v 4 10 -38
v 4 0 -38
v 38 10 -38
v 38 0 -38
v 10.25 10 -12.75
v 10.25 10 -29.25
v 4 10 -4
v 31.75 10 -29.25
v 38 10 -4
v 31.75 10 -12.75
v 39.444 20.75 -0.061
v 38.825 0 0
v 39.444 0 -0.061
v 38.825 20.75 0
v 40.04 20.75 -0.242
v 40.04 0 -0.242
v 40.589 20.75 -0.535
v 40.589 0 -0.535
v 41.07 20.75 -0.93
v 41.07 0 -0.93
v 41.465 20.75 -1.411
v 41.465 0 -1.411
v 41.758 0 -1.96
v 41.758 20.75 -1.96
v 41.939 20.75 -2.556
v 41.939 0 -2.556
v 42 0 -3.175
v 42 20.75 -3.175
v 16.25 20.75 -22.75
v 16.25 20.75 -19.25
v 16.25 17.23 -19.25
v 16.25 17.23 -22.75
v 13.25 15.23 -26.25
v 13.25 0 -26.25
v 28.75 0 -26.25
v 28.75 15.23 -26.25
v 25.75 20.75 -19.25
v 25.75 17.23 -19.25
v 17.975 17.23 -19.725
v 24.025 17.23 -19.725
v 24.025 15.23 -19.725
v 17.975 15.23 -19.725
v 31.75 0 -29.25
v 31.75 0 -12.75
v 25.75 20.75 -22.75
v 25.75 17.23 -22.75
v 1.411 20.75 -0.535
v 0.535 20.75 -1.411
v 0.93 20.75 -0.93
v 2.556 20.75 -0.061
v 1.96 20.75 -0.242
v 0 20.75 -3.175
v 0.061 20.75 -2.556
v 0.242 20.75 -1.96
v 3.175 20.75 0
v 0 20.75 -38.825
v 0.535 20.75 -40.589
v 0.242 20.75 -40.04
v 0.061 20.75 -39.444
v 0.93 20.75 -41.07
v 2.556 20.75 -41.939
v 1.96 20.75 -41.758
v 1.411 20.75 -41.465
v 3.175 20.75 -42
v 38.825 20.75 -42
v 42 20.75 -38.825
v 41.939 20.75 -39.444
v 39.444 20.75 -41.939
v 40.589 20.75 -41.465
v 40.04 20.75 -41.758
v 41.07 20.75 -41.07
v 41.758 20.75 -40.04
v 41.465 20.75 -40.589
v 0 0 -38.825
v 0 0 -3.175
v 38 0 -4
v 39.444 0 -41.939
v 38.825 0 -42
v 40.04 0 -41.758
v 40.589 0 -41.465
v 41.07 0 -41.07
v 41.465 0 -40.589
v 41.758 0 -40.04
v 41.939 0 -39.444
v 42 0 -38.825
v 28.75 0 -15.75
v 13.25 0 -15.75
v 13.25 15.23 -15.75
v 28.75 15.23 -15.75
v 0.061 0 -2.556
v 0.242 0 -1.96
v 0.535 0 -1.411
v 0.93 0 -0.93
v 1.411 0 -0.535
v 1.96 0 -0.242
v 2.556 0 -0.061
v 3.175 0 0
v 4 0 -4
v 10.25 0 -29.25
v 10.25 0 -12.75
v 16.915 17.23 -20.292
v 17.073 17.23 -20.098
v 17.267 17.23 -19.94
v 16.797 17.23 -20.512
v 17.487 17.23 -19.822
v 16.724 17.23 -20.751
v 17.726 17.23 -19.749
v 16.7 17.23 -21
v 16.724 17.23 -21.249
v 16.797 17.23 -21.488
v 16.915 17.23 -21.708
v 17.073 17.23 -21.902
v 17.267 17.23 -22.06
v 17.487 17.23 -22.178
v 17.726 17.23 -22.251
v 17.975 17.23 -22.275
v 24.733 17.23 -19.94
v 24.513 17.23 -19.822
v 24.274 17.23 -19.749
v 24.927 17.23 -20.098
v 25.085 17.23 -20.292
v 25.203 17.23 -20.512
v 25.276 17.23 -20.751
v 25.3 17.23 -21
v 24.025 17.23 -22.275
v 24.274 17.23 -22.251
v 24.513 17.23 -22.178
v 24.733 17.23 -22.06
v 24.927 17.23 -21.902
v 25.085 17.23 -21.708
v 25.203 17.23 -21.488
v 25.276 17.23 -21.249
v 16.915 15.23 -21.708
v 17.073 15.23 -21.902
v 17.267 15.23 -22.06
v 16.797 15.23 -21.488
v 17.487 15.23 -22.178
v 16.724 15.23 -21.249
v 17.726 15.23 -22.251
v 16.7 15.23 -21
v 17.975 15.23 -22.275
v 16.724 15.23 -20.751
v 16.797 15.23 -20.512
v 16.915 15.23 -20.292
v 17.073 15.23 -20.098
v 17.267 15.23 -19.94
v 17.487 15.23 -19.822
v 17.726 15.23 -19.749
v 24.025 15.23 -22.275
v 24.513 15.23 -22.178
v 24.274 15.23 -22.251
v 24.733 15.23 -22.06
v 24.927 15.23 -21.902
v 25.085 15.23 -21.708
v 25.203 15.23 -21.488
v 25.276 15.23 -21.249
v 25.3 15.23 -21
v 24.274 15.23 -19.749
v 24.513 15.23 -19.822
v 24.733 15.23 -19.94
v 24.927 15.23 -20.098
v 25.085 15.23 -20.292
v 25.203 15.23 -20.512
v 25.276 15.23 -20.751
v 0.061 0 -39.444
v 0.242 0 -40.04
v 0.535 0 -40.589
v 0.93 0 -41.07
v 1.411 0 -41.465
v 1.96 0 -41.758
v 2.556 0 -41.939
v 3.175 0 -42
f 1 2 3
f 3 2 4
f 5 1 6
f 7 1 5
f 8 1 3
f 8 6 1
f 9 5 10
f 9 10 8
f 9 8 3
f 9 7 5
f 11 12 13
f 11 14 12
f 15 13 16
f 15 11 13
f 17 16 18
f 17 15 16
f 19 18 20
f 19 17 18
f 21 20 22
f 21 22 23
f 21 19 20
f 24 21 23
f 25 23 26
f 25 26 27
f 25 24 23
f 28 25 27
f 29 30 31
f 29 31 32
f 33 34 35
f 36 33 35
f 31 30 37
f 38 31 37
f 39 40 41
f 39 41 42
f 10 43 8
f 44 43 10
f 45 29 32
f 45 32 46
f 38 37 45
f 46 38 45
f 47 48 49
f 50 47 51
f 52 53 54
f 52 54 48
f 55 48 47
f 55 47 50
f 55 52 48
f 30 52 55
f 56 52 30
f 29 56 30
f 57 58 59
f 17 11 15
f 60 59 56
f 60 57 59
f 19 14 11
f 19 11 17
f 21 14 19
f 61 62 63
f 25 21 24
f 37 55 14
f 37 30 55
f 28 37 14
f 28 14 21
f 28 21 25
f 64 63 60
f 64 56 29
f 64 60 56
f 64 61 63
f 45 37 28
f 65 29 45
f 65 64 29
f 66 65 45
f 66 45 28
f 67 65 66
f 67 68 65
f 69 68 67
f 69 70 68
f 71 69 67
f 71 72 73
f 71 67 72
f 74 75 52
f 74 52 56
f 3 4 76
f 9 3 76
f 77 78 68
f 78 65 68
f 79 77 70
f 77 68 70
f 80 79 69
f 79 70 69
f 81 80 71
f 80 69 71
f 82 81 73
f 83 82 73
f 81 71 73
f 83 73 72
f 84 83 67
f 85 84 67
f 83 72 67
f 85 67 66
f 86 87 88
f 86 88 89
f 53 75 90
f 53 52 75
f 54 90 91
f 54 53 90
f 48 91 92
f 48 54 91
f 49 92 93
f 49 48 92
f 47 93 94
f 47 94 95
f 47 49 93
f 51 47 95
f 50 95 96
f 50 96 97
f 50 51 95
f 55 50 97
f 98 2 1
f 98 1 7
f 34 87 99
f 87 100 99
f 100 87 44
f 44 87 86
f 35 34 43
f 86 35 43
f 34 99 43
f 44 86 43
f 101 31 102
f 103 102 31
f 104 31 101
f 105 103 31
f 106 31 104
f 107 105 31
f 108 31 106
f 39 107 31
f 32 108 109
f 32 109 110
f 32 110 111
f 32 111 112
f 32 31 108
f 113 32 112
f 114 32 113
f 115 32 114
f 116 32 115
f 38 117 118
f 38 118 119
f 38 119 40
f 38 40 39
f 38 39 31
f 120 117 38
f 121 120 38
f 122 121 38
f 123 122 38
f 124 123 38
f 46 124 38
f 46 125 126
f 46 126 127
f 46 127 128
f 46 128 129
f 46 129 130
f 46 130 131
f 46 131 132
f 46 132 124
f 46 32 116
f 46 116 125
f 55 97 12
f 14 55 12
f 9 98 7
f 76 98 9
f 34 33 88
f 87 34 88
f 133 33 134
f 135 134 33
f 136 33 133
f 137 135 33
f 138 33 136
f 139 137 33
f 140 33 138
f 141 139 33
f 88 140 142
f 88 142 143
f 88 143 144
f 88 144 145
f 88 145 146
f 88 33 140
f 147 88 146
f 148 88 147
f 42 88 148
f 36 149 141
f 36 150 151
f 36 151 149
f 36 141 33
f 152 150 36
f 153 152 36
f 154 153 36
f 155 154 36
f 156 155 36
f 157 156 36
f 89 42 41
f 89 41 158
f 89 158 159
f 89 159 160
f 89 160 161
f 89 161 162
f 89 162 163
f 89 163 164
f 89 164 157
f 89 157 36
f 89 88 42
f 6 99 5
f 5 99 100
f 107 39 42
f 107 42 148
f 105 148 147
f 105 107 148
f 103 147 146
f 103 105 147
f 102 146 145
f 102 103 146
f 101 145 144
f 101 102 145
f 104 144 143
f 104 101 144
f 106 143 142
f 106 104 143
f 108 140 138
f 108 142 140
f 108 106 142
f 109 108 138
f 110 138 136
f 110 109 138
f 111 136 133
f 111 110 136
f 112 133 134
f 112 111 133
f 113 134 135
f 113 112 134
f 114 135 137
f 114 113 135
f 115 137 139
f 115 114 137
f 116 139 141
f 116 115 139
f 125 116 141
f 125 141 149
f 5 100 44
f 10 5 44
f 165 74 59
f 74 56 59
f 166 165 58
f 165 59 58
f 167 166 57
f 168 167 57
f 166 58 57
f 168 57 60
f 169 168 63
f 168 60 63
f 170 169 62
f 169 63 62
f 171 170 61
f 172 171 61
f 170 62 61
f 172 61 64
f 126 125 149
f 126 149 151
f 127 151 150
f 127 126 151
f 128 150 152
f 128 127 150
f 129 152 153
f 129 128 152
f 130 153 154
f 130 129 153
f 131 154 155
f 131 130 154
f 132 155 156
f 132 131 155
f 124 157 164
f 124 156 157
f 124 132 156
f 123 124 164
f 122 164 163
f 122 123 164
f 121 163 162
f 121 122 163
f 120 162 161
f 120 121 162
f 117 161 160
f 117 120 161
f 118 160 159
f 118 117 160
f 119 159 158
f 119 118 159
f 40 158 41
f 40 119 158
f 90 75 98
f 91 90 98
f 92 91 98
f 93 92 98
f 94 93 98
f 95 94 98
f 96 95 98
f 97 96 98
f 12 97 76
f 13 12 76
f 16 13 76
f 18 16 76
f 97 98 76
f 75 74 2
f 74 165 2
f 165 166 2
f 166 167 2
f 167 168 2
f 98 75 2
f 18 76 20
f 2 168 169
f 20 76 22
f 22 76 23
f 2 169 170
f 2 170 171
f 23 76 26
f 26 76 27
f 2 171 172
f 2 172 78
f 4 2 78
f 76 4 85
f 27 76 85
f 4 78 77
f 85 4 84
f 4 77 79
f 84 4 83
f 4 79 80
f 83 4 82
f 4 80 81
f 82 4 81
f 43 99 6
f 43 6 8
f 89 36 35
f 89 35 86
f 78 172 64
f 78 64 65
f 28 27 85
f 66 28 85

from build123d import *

# Parameters (mm, degrees)
SKETCH1_W           = 42
SKETCH1_H           = 42
BOSS_EXTRUDE1_DEPTH = 20.75
SKETCH2_W           = 9.5
SKETCH2_H           = 3.5
CUT_EXTRUDE4_DEPTH  = 3.52
SKETCH3_W           = 15.5
SKETCH3_H           = 10.5
CUT_EXTRUDE1_DEPTH  = 15.23
CUT_EXTRUDE2_REACH  = 19.23
SKETCH5_W           = 34
SKETCH5_H           = 34
SKETCH5_W_2         = 21.5
SKETCH5_H_2         = 16.5
CUT_EXTRUDE5_DEPTH  = 10
FILLET1_R           = 3.175


with BuildPart() as part:
    # Sketch1 → Boss-Extrude1 (new body)
    with BuildSketch(Plane(origin=(0, 0, 0), x_dir=(1, 0, 0), z_dir=(0, 1, 0))):
        with Locations((21, 21)):
            Rectangle(SKETCH1_W, SKETCH1_H)
    extrude(amount=BOSS_EXTRUDE1_DEPTH)

    # Sketch2 → Cut-Extrude4 (cut)
    with BuildSketch(Plane(origin=(0, 20.75, 0), x_dir=(1, 0, 0), z_dir=(0, 1, 0))):
        with Locations((21, 21)):
            Rectangle(SKETCH2_W, SKETCH2_H)
    extrude(amount=-CUT_EXTRUDE4_DEPTH, mode=Mode.SUBTRACT)

    # Sketch3 → Cut-Extrude1 (cut)
    with BuildSketch(Plane.XZ):
        with Locations((21, -21)):
            Rectangle(SKETCH3_W, SKETCH3_H)
    extrude(amount=-CUT_EXTRUDE1_DEPTH, mode=Mode.SUBTRACT)

    # Sketch4 → Cut-Extrude2 (cut, up to next)
    with BuildSketch(Plane(origin=(0, 17.23, 0), x_dir=(1, 0, 0), z_dir=(0, 1, 0)), mode=Mode.PRIVATE) as cut_extrude2_sk1:
        with BuildLine():
            Line((17.975, 22.275), (24.025, 22.275))
            ThreePointArc((24.025, 22.275), (25.3, 21), (24.025, 19.725))
            Line((24.025, 19.725), (17.975, 19.725))
            ThreePointArc((17.975, 19.725), (16.7, 21), (17.975, 22.275))
        make_face()
    cut_extrude2_tool1 = extrude(cut_extrude2_sk1.sketch, amount=-CUT_EXTRUDE2_REACH, mode=Mode.PRIVATE) & part.part
    add(cut_extrude2_tool1.solids().sort_by_distance((21, 17.23, -21))[0], mode=Mode.SUBTRACT)

    # Sketch5 → Cut-Extrude5 (cut)
    with BuildSketch(Plane.XZ):
        with Locations((21, -21)):
            Rectangle(SKETCH5_W, SKETCH5_H)
        with Locations((21, -21)):
            Rectangle(SKETCH5_W_2, SKETCH5_H_2, mode=Mode.SUBTRACT)
    extrude(amount=-CUT_EXTRUDE5_DEPTH, mode=Mode.SUBTRACT)

    # Fillet1
    fillet1_edges = [part.edges().sort_by_distance(p)[0] for p in [
        (0, 10.375, -42),
        (42, 10.375, -42),
        (42, 10.375, 0),
        (0, 10.375, 0),
    ]]
    fillet(fillet1_edges, radius=FILLET1_R)


solid = part.part
